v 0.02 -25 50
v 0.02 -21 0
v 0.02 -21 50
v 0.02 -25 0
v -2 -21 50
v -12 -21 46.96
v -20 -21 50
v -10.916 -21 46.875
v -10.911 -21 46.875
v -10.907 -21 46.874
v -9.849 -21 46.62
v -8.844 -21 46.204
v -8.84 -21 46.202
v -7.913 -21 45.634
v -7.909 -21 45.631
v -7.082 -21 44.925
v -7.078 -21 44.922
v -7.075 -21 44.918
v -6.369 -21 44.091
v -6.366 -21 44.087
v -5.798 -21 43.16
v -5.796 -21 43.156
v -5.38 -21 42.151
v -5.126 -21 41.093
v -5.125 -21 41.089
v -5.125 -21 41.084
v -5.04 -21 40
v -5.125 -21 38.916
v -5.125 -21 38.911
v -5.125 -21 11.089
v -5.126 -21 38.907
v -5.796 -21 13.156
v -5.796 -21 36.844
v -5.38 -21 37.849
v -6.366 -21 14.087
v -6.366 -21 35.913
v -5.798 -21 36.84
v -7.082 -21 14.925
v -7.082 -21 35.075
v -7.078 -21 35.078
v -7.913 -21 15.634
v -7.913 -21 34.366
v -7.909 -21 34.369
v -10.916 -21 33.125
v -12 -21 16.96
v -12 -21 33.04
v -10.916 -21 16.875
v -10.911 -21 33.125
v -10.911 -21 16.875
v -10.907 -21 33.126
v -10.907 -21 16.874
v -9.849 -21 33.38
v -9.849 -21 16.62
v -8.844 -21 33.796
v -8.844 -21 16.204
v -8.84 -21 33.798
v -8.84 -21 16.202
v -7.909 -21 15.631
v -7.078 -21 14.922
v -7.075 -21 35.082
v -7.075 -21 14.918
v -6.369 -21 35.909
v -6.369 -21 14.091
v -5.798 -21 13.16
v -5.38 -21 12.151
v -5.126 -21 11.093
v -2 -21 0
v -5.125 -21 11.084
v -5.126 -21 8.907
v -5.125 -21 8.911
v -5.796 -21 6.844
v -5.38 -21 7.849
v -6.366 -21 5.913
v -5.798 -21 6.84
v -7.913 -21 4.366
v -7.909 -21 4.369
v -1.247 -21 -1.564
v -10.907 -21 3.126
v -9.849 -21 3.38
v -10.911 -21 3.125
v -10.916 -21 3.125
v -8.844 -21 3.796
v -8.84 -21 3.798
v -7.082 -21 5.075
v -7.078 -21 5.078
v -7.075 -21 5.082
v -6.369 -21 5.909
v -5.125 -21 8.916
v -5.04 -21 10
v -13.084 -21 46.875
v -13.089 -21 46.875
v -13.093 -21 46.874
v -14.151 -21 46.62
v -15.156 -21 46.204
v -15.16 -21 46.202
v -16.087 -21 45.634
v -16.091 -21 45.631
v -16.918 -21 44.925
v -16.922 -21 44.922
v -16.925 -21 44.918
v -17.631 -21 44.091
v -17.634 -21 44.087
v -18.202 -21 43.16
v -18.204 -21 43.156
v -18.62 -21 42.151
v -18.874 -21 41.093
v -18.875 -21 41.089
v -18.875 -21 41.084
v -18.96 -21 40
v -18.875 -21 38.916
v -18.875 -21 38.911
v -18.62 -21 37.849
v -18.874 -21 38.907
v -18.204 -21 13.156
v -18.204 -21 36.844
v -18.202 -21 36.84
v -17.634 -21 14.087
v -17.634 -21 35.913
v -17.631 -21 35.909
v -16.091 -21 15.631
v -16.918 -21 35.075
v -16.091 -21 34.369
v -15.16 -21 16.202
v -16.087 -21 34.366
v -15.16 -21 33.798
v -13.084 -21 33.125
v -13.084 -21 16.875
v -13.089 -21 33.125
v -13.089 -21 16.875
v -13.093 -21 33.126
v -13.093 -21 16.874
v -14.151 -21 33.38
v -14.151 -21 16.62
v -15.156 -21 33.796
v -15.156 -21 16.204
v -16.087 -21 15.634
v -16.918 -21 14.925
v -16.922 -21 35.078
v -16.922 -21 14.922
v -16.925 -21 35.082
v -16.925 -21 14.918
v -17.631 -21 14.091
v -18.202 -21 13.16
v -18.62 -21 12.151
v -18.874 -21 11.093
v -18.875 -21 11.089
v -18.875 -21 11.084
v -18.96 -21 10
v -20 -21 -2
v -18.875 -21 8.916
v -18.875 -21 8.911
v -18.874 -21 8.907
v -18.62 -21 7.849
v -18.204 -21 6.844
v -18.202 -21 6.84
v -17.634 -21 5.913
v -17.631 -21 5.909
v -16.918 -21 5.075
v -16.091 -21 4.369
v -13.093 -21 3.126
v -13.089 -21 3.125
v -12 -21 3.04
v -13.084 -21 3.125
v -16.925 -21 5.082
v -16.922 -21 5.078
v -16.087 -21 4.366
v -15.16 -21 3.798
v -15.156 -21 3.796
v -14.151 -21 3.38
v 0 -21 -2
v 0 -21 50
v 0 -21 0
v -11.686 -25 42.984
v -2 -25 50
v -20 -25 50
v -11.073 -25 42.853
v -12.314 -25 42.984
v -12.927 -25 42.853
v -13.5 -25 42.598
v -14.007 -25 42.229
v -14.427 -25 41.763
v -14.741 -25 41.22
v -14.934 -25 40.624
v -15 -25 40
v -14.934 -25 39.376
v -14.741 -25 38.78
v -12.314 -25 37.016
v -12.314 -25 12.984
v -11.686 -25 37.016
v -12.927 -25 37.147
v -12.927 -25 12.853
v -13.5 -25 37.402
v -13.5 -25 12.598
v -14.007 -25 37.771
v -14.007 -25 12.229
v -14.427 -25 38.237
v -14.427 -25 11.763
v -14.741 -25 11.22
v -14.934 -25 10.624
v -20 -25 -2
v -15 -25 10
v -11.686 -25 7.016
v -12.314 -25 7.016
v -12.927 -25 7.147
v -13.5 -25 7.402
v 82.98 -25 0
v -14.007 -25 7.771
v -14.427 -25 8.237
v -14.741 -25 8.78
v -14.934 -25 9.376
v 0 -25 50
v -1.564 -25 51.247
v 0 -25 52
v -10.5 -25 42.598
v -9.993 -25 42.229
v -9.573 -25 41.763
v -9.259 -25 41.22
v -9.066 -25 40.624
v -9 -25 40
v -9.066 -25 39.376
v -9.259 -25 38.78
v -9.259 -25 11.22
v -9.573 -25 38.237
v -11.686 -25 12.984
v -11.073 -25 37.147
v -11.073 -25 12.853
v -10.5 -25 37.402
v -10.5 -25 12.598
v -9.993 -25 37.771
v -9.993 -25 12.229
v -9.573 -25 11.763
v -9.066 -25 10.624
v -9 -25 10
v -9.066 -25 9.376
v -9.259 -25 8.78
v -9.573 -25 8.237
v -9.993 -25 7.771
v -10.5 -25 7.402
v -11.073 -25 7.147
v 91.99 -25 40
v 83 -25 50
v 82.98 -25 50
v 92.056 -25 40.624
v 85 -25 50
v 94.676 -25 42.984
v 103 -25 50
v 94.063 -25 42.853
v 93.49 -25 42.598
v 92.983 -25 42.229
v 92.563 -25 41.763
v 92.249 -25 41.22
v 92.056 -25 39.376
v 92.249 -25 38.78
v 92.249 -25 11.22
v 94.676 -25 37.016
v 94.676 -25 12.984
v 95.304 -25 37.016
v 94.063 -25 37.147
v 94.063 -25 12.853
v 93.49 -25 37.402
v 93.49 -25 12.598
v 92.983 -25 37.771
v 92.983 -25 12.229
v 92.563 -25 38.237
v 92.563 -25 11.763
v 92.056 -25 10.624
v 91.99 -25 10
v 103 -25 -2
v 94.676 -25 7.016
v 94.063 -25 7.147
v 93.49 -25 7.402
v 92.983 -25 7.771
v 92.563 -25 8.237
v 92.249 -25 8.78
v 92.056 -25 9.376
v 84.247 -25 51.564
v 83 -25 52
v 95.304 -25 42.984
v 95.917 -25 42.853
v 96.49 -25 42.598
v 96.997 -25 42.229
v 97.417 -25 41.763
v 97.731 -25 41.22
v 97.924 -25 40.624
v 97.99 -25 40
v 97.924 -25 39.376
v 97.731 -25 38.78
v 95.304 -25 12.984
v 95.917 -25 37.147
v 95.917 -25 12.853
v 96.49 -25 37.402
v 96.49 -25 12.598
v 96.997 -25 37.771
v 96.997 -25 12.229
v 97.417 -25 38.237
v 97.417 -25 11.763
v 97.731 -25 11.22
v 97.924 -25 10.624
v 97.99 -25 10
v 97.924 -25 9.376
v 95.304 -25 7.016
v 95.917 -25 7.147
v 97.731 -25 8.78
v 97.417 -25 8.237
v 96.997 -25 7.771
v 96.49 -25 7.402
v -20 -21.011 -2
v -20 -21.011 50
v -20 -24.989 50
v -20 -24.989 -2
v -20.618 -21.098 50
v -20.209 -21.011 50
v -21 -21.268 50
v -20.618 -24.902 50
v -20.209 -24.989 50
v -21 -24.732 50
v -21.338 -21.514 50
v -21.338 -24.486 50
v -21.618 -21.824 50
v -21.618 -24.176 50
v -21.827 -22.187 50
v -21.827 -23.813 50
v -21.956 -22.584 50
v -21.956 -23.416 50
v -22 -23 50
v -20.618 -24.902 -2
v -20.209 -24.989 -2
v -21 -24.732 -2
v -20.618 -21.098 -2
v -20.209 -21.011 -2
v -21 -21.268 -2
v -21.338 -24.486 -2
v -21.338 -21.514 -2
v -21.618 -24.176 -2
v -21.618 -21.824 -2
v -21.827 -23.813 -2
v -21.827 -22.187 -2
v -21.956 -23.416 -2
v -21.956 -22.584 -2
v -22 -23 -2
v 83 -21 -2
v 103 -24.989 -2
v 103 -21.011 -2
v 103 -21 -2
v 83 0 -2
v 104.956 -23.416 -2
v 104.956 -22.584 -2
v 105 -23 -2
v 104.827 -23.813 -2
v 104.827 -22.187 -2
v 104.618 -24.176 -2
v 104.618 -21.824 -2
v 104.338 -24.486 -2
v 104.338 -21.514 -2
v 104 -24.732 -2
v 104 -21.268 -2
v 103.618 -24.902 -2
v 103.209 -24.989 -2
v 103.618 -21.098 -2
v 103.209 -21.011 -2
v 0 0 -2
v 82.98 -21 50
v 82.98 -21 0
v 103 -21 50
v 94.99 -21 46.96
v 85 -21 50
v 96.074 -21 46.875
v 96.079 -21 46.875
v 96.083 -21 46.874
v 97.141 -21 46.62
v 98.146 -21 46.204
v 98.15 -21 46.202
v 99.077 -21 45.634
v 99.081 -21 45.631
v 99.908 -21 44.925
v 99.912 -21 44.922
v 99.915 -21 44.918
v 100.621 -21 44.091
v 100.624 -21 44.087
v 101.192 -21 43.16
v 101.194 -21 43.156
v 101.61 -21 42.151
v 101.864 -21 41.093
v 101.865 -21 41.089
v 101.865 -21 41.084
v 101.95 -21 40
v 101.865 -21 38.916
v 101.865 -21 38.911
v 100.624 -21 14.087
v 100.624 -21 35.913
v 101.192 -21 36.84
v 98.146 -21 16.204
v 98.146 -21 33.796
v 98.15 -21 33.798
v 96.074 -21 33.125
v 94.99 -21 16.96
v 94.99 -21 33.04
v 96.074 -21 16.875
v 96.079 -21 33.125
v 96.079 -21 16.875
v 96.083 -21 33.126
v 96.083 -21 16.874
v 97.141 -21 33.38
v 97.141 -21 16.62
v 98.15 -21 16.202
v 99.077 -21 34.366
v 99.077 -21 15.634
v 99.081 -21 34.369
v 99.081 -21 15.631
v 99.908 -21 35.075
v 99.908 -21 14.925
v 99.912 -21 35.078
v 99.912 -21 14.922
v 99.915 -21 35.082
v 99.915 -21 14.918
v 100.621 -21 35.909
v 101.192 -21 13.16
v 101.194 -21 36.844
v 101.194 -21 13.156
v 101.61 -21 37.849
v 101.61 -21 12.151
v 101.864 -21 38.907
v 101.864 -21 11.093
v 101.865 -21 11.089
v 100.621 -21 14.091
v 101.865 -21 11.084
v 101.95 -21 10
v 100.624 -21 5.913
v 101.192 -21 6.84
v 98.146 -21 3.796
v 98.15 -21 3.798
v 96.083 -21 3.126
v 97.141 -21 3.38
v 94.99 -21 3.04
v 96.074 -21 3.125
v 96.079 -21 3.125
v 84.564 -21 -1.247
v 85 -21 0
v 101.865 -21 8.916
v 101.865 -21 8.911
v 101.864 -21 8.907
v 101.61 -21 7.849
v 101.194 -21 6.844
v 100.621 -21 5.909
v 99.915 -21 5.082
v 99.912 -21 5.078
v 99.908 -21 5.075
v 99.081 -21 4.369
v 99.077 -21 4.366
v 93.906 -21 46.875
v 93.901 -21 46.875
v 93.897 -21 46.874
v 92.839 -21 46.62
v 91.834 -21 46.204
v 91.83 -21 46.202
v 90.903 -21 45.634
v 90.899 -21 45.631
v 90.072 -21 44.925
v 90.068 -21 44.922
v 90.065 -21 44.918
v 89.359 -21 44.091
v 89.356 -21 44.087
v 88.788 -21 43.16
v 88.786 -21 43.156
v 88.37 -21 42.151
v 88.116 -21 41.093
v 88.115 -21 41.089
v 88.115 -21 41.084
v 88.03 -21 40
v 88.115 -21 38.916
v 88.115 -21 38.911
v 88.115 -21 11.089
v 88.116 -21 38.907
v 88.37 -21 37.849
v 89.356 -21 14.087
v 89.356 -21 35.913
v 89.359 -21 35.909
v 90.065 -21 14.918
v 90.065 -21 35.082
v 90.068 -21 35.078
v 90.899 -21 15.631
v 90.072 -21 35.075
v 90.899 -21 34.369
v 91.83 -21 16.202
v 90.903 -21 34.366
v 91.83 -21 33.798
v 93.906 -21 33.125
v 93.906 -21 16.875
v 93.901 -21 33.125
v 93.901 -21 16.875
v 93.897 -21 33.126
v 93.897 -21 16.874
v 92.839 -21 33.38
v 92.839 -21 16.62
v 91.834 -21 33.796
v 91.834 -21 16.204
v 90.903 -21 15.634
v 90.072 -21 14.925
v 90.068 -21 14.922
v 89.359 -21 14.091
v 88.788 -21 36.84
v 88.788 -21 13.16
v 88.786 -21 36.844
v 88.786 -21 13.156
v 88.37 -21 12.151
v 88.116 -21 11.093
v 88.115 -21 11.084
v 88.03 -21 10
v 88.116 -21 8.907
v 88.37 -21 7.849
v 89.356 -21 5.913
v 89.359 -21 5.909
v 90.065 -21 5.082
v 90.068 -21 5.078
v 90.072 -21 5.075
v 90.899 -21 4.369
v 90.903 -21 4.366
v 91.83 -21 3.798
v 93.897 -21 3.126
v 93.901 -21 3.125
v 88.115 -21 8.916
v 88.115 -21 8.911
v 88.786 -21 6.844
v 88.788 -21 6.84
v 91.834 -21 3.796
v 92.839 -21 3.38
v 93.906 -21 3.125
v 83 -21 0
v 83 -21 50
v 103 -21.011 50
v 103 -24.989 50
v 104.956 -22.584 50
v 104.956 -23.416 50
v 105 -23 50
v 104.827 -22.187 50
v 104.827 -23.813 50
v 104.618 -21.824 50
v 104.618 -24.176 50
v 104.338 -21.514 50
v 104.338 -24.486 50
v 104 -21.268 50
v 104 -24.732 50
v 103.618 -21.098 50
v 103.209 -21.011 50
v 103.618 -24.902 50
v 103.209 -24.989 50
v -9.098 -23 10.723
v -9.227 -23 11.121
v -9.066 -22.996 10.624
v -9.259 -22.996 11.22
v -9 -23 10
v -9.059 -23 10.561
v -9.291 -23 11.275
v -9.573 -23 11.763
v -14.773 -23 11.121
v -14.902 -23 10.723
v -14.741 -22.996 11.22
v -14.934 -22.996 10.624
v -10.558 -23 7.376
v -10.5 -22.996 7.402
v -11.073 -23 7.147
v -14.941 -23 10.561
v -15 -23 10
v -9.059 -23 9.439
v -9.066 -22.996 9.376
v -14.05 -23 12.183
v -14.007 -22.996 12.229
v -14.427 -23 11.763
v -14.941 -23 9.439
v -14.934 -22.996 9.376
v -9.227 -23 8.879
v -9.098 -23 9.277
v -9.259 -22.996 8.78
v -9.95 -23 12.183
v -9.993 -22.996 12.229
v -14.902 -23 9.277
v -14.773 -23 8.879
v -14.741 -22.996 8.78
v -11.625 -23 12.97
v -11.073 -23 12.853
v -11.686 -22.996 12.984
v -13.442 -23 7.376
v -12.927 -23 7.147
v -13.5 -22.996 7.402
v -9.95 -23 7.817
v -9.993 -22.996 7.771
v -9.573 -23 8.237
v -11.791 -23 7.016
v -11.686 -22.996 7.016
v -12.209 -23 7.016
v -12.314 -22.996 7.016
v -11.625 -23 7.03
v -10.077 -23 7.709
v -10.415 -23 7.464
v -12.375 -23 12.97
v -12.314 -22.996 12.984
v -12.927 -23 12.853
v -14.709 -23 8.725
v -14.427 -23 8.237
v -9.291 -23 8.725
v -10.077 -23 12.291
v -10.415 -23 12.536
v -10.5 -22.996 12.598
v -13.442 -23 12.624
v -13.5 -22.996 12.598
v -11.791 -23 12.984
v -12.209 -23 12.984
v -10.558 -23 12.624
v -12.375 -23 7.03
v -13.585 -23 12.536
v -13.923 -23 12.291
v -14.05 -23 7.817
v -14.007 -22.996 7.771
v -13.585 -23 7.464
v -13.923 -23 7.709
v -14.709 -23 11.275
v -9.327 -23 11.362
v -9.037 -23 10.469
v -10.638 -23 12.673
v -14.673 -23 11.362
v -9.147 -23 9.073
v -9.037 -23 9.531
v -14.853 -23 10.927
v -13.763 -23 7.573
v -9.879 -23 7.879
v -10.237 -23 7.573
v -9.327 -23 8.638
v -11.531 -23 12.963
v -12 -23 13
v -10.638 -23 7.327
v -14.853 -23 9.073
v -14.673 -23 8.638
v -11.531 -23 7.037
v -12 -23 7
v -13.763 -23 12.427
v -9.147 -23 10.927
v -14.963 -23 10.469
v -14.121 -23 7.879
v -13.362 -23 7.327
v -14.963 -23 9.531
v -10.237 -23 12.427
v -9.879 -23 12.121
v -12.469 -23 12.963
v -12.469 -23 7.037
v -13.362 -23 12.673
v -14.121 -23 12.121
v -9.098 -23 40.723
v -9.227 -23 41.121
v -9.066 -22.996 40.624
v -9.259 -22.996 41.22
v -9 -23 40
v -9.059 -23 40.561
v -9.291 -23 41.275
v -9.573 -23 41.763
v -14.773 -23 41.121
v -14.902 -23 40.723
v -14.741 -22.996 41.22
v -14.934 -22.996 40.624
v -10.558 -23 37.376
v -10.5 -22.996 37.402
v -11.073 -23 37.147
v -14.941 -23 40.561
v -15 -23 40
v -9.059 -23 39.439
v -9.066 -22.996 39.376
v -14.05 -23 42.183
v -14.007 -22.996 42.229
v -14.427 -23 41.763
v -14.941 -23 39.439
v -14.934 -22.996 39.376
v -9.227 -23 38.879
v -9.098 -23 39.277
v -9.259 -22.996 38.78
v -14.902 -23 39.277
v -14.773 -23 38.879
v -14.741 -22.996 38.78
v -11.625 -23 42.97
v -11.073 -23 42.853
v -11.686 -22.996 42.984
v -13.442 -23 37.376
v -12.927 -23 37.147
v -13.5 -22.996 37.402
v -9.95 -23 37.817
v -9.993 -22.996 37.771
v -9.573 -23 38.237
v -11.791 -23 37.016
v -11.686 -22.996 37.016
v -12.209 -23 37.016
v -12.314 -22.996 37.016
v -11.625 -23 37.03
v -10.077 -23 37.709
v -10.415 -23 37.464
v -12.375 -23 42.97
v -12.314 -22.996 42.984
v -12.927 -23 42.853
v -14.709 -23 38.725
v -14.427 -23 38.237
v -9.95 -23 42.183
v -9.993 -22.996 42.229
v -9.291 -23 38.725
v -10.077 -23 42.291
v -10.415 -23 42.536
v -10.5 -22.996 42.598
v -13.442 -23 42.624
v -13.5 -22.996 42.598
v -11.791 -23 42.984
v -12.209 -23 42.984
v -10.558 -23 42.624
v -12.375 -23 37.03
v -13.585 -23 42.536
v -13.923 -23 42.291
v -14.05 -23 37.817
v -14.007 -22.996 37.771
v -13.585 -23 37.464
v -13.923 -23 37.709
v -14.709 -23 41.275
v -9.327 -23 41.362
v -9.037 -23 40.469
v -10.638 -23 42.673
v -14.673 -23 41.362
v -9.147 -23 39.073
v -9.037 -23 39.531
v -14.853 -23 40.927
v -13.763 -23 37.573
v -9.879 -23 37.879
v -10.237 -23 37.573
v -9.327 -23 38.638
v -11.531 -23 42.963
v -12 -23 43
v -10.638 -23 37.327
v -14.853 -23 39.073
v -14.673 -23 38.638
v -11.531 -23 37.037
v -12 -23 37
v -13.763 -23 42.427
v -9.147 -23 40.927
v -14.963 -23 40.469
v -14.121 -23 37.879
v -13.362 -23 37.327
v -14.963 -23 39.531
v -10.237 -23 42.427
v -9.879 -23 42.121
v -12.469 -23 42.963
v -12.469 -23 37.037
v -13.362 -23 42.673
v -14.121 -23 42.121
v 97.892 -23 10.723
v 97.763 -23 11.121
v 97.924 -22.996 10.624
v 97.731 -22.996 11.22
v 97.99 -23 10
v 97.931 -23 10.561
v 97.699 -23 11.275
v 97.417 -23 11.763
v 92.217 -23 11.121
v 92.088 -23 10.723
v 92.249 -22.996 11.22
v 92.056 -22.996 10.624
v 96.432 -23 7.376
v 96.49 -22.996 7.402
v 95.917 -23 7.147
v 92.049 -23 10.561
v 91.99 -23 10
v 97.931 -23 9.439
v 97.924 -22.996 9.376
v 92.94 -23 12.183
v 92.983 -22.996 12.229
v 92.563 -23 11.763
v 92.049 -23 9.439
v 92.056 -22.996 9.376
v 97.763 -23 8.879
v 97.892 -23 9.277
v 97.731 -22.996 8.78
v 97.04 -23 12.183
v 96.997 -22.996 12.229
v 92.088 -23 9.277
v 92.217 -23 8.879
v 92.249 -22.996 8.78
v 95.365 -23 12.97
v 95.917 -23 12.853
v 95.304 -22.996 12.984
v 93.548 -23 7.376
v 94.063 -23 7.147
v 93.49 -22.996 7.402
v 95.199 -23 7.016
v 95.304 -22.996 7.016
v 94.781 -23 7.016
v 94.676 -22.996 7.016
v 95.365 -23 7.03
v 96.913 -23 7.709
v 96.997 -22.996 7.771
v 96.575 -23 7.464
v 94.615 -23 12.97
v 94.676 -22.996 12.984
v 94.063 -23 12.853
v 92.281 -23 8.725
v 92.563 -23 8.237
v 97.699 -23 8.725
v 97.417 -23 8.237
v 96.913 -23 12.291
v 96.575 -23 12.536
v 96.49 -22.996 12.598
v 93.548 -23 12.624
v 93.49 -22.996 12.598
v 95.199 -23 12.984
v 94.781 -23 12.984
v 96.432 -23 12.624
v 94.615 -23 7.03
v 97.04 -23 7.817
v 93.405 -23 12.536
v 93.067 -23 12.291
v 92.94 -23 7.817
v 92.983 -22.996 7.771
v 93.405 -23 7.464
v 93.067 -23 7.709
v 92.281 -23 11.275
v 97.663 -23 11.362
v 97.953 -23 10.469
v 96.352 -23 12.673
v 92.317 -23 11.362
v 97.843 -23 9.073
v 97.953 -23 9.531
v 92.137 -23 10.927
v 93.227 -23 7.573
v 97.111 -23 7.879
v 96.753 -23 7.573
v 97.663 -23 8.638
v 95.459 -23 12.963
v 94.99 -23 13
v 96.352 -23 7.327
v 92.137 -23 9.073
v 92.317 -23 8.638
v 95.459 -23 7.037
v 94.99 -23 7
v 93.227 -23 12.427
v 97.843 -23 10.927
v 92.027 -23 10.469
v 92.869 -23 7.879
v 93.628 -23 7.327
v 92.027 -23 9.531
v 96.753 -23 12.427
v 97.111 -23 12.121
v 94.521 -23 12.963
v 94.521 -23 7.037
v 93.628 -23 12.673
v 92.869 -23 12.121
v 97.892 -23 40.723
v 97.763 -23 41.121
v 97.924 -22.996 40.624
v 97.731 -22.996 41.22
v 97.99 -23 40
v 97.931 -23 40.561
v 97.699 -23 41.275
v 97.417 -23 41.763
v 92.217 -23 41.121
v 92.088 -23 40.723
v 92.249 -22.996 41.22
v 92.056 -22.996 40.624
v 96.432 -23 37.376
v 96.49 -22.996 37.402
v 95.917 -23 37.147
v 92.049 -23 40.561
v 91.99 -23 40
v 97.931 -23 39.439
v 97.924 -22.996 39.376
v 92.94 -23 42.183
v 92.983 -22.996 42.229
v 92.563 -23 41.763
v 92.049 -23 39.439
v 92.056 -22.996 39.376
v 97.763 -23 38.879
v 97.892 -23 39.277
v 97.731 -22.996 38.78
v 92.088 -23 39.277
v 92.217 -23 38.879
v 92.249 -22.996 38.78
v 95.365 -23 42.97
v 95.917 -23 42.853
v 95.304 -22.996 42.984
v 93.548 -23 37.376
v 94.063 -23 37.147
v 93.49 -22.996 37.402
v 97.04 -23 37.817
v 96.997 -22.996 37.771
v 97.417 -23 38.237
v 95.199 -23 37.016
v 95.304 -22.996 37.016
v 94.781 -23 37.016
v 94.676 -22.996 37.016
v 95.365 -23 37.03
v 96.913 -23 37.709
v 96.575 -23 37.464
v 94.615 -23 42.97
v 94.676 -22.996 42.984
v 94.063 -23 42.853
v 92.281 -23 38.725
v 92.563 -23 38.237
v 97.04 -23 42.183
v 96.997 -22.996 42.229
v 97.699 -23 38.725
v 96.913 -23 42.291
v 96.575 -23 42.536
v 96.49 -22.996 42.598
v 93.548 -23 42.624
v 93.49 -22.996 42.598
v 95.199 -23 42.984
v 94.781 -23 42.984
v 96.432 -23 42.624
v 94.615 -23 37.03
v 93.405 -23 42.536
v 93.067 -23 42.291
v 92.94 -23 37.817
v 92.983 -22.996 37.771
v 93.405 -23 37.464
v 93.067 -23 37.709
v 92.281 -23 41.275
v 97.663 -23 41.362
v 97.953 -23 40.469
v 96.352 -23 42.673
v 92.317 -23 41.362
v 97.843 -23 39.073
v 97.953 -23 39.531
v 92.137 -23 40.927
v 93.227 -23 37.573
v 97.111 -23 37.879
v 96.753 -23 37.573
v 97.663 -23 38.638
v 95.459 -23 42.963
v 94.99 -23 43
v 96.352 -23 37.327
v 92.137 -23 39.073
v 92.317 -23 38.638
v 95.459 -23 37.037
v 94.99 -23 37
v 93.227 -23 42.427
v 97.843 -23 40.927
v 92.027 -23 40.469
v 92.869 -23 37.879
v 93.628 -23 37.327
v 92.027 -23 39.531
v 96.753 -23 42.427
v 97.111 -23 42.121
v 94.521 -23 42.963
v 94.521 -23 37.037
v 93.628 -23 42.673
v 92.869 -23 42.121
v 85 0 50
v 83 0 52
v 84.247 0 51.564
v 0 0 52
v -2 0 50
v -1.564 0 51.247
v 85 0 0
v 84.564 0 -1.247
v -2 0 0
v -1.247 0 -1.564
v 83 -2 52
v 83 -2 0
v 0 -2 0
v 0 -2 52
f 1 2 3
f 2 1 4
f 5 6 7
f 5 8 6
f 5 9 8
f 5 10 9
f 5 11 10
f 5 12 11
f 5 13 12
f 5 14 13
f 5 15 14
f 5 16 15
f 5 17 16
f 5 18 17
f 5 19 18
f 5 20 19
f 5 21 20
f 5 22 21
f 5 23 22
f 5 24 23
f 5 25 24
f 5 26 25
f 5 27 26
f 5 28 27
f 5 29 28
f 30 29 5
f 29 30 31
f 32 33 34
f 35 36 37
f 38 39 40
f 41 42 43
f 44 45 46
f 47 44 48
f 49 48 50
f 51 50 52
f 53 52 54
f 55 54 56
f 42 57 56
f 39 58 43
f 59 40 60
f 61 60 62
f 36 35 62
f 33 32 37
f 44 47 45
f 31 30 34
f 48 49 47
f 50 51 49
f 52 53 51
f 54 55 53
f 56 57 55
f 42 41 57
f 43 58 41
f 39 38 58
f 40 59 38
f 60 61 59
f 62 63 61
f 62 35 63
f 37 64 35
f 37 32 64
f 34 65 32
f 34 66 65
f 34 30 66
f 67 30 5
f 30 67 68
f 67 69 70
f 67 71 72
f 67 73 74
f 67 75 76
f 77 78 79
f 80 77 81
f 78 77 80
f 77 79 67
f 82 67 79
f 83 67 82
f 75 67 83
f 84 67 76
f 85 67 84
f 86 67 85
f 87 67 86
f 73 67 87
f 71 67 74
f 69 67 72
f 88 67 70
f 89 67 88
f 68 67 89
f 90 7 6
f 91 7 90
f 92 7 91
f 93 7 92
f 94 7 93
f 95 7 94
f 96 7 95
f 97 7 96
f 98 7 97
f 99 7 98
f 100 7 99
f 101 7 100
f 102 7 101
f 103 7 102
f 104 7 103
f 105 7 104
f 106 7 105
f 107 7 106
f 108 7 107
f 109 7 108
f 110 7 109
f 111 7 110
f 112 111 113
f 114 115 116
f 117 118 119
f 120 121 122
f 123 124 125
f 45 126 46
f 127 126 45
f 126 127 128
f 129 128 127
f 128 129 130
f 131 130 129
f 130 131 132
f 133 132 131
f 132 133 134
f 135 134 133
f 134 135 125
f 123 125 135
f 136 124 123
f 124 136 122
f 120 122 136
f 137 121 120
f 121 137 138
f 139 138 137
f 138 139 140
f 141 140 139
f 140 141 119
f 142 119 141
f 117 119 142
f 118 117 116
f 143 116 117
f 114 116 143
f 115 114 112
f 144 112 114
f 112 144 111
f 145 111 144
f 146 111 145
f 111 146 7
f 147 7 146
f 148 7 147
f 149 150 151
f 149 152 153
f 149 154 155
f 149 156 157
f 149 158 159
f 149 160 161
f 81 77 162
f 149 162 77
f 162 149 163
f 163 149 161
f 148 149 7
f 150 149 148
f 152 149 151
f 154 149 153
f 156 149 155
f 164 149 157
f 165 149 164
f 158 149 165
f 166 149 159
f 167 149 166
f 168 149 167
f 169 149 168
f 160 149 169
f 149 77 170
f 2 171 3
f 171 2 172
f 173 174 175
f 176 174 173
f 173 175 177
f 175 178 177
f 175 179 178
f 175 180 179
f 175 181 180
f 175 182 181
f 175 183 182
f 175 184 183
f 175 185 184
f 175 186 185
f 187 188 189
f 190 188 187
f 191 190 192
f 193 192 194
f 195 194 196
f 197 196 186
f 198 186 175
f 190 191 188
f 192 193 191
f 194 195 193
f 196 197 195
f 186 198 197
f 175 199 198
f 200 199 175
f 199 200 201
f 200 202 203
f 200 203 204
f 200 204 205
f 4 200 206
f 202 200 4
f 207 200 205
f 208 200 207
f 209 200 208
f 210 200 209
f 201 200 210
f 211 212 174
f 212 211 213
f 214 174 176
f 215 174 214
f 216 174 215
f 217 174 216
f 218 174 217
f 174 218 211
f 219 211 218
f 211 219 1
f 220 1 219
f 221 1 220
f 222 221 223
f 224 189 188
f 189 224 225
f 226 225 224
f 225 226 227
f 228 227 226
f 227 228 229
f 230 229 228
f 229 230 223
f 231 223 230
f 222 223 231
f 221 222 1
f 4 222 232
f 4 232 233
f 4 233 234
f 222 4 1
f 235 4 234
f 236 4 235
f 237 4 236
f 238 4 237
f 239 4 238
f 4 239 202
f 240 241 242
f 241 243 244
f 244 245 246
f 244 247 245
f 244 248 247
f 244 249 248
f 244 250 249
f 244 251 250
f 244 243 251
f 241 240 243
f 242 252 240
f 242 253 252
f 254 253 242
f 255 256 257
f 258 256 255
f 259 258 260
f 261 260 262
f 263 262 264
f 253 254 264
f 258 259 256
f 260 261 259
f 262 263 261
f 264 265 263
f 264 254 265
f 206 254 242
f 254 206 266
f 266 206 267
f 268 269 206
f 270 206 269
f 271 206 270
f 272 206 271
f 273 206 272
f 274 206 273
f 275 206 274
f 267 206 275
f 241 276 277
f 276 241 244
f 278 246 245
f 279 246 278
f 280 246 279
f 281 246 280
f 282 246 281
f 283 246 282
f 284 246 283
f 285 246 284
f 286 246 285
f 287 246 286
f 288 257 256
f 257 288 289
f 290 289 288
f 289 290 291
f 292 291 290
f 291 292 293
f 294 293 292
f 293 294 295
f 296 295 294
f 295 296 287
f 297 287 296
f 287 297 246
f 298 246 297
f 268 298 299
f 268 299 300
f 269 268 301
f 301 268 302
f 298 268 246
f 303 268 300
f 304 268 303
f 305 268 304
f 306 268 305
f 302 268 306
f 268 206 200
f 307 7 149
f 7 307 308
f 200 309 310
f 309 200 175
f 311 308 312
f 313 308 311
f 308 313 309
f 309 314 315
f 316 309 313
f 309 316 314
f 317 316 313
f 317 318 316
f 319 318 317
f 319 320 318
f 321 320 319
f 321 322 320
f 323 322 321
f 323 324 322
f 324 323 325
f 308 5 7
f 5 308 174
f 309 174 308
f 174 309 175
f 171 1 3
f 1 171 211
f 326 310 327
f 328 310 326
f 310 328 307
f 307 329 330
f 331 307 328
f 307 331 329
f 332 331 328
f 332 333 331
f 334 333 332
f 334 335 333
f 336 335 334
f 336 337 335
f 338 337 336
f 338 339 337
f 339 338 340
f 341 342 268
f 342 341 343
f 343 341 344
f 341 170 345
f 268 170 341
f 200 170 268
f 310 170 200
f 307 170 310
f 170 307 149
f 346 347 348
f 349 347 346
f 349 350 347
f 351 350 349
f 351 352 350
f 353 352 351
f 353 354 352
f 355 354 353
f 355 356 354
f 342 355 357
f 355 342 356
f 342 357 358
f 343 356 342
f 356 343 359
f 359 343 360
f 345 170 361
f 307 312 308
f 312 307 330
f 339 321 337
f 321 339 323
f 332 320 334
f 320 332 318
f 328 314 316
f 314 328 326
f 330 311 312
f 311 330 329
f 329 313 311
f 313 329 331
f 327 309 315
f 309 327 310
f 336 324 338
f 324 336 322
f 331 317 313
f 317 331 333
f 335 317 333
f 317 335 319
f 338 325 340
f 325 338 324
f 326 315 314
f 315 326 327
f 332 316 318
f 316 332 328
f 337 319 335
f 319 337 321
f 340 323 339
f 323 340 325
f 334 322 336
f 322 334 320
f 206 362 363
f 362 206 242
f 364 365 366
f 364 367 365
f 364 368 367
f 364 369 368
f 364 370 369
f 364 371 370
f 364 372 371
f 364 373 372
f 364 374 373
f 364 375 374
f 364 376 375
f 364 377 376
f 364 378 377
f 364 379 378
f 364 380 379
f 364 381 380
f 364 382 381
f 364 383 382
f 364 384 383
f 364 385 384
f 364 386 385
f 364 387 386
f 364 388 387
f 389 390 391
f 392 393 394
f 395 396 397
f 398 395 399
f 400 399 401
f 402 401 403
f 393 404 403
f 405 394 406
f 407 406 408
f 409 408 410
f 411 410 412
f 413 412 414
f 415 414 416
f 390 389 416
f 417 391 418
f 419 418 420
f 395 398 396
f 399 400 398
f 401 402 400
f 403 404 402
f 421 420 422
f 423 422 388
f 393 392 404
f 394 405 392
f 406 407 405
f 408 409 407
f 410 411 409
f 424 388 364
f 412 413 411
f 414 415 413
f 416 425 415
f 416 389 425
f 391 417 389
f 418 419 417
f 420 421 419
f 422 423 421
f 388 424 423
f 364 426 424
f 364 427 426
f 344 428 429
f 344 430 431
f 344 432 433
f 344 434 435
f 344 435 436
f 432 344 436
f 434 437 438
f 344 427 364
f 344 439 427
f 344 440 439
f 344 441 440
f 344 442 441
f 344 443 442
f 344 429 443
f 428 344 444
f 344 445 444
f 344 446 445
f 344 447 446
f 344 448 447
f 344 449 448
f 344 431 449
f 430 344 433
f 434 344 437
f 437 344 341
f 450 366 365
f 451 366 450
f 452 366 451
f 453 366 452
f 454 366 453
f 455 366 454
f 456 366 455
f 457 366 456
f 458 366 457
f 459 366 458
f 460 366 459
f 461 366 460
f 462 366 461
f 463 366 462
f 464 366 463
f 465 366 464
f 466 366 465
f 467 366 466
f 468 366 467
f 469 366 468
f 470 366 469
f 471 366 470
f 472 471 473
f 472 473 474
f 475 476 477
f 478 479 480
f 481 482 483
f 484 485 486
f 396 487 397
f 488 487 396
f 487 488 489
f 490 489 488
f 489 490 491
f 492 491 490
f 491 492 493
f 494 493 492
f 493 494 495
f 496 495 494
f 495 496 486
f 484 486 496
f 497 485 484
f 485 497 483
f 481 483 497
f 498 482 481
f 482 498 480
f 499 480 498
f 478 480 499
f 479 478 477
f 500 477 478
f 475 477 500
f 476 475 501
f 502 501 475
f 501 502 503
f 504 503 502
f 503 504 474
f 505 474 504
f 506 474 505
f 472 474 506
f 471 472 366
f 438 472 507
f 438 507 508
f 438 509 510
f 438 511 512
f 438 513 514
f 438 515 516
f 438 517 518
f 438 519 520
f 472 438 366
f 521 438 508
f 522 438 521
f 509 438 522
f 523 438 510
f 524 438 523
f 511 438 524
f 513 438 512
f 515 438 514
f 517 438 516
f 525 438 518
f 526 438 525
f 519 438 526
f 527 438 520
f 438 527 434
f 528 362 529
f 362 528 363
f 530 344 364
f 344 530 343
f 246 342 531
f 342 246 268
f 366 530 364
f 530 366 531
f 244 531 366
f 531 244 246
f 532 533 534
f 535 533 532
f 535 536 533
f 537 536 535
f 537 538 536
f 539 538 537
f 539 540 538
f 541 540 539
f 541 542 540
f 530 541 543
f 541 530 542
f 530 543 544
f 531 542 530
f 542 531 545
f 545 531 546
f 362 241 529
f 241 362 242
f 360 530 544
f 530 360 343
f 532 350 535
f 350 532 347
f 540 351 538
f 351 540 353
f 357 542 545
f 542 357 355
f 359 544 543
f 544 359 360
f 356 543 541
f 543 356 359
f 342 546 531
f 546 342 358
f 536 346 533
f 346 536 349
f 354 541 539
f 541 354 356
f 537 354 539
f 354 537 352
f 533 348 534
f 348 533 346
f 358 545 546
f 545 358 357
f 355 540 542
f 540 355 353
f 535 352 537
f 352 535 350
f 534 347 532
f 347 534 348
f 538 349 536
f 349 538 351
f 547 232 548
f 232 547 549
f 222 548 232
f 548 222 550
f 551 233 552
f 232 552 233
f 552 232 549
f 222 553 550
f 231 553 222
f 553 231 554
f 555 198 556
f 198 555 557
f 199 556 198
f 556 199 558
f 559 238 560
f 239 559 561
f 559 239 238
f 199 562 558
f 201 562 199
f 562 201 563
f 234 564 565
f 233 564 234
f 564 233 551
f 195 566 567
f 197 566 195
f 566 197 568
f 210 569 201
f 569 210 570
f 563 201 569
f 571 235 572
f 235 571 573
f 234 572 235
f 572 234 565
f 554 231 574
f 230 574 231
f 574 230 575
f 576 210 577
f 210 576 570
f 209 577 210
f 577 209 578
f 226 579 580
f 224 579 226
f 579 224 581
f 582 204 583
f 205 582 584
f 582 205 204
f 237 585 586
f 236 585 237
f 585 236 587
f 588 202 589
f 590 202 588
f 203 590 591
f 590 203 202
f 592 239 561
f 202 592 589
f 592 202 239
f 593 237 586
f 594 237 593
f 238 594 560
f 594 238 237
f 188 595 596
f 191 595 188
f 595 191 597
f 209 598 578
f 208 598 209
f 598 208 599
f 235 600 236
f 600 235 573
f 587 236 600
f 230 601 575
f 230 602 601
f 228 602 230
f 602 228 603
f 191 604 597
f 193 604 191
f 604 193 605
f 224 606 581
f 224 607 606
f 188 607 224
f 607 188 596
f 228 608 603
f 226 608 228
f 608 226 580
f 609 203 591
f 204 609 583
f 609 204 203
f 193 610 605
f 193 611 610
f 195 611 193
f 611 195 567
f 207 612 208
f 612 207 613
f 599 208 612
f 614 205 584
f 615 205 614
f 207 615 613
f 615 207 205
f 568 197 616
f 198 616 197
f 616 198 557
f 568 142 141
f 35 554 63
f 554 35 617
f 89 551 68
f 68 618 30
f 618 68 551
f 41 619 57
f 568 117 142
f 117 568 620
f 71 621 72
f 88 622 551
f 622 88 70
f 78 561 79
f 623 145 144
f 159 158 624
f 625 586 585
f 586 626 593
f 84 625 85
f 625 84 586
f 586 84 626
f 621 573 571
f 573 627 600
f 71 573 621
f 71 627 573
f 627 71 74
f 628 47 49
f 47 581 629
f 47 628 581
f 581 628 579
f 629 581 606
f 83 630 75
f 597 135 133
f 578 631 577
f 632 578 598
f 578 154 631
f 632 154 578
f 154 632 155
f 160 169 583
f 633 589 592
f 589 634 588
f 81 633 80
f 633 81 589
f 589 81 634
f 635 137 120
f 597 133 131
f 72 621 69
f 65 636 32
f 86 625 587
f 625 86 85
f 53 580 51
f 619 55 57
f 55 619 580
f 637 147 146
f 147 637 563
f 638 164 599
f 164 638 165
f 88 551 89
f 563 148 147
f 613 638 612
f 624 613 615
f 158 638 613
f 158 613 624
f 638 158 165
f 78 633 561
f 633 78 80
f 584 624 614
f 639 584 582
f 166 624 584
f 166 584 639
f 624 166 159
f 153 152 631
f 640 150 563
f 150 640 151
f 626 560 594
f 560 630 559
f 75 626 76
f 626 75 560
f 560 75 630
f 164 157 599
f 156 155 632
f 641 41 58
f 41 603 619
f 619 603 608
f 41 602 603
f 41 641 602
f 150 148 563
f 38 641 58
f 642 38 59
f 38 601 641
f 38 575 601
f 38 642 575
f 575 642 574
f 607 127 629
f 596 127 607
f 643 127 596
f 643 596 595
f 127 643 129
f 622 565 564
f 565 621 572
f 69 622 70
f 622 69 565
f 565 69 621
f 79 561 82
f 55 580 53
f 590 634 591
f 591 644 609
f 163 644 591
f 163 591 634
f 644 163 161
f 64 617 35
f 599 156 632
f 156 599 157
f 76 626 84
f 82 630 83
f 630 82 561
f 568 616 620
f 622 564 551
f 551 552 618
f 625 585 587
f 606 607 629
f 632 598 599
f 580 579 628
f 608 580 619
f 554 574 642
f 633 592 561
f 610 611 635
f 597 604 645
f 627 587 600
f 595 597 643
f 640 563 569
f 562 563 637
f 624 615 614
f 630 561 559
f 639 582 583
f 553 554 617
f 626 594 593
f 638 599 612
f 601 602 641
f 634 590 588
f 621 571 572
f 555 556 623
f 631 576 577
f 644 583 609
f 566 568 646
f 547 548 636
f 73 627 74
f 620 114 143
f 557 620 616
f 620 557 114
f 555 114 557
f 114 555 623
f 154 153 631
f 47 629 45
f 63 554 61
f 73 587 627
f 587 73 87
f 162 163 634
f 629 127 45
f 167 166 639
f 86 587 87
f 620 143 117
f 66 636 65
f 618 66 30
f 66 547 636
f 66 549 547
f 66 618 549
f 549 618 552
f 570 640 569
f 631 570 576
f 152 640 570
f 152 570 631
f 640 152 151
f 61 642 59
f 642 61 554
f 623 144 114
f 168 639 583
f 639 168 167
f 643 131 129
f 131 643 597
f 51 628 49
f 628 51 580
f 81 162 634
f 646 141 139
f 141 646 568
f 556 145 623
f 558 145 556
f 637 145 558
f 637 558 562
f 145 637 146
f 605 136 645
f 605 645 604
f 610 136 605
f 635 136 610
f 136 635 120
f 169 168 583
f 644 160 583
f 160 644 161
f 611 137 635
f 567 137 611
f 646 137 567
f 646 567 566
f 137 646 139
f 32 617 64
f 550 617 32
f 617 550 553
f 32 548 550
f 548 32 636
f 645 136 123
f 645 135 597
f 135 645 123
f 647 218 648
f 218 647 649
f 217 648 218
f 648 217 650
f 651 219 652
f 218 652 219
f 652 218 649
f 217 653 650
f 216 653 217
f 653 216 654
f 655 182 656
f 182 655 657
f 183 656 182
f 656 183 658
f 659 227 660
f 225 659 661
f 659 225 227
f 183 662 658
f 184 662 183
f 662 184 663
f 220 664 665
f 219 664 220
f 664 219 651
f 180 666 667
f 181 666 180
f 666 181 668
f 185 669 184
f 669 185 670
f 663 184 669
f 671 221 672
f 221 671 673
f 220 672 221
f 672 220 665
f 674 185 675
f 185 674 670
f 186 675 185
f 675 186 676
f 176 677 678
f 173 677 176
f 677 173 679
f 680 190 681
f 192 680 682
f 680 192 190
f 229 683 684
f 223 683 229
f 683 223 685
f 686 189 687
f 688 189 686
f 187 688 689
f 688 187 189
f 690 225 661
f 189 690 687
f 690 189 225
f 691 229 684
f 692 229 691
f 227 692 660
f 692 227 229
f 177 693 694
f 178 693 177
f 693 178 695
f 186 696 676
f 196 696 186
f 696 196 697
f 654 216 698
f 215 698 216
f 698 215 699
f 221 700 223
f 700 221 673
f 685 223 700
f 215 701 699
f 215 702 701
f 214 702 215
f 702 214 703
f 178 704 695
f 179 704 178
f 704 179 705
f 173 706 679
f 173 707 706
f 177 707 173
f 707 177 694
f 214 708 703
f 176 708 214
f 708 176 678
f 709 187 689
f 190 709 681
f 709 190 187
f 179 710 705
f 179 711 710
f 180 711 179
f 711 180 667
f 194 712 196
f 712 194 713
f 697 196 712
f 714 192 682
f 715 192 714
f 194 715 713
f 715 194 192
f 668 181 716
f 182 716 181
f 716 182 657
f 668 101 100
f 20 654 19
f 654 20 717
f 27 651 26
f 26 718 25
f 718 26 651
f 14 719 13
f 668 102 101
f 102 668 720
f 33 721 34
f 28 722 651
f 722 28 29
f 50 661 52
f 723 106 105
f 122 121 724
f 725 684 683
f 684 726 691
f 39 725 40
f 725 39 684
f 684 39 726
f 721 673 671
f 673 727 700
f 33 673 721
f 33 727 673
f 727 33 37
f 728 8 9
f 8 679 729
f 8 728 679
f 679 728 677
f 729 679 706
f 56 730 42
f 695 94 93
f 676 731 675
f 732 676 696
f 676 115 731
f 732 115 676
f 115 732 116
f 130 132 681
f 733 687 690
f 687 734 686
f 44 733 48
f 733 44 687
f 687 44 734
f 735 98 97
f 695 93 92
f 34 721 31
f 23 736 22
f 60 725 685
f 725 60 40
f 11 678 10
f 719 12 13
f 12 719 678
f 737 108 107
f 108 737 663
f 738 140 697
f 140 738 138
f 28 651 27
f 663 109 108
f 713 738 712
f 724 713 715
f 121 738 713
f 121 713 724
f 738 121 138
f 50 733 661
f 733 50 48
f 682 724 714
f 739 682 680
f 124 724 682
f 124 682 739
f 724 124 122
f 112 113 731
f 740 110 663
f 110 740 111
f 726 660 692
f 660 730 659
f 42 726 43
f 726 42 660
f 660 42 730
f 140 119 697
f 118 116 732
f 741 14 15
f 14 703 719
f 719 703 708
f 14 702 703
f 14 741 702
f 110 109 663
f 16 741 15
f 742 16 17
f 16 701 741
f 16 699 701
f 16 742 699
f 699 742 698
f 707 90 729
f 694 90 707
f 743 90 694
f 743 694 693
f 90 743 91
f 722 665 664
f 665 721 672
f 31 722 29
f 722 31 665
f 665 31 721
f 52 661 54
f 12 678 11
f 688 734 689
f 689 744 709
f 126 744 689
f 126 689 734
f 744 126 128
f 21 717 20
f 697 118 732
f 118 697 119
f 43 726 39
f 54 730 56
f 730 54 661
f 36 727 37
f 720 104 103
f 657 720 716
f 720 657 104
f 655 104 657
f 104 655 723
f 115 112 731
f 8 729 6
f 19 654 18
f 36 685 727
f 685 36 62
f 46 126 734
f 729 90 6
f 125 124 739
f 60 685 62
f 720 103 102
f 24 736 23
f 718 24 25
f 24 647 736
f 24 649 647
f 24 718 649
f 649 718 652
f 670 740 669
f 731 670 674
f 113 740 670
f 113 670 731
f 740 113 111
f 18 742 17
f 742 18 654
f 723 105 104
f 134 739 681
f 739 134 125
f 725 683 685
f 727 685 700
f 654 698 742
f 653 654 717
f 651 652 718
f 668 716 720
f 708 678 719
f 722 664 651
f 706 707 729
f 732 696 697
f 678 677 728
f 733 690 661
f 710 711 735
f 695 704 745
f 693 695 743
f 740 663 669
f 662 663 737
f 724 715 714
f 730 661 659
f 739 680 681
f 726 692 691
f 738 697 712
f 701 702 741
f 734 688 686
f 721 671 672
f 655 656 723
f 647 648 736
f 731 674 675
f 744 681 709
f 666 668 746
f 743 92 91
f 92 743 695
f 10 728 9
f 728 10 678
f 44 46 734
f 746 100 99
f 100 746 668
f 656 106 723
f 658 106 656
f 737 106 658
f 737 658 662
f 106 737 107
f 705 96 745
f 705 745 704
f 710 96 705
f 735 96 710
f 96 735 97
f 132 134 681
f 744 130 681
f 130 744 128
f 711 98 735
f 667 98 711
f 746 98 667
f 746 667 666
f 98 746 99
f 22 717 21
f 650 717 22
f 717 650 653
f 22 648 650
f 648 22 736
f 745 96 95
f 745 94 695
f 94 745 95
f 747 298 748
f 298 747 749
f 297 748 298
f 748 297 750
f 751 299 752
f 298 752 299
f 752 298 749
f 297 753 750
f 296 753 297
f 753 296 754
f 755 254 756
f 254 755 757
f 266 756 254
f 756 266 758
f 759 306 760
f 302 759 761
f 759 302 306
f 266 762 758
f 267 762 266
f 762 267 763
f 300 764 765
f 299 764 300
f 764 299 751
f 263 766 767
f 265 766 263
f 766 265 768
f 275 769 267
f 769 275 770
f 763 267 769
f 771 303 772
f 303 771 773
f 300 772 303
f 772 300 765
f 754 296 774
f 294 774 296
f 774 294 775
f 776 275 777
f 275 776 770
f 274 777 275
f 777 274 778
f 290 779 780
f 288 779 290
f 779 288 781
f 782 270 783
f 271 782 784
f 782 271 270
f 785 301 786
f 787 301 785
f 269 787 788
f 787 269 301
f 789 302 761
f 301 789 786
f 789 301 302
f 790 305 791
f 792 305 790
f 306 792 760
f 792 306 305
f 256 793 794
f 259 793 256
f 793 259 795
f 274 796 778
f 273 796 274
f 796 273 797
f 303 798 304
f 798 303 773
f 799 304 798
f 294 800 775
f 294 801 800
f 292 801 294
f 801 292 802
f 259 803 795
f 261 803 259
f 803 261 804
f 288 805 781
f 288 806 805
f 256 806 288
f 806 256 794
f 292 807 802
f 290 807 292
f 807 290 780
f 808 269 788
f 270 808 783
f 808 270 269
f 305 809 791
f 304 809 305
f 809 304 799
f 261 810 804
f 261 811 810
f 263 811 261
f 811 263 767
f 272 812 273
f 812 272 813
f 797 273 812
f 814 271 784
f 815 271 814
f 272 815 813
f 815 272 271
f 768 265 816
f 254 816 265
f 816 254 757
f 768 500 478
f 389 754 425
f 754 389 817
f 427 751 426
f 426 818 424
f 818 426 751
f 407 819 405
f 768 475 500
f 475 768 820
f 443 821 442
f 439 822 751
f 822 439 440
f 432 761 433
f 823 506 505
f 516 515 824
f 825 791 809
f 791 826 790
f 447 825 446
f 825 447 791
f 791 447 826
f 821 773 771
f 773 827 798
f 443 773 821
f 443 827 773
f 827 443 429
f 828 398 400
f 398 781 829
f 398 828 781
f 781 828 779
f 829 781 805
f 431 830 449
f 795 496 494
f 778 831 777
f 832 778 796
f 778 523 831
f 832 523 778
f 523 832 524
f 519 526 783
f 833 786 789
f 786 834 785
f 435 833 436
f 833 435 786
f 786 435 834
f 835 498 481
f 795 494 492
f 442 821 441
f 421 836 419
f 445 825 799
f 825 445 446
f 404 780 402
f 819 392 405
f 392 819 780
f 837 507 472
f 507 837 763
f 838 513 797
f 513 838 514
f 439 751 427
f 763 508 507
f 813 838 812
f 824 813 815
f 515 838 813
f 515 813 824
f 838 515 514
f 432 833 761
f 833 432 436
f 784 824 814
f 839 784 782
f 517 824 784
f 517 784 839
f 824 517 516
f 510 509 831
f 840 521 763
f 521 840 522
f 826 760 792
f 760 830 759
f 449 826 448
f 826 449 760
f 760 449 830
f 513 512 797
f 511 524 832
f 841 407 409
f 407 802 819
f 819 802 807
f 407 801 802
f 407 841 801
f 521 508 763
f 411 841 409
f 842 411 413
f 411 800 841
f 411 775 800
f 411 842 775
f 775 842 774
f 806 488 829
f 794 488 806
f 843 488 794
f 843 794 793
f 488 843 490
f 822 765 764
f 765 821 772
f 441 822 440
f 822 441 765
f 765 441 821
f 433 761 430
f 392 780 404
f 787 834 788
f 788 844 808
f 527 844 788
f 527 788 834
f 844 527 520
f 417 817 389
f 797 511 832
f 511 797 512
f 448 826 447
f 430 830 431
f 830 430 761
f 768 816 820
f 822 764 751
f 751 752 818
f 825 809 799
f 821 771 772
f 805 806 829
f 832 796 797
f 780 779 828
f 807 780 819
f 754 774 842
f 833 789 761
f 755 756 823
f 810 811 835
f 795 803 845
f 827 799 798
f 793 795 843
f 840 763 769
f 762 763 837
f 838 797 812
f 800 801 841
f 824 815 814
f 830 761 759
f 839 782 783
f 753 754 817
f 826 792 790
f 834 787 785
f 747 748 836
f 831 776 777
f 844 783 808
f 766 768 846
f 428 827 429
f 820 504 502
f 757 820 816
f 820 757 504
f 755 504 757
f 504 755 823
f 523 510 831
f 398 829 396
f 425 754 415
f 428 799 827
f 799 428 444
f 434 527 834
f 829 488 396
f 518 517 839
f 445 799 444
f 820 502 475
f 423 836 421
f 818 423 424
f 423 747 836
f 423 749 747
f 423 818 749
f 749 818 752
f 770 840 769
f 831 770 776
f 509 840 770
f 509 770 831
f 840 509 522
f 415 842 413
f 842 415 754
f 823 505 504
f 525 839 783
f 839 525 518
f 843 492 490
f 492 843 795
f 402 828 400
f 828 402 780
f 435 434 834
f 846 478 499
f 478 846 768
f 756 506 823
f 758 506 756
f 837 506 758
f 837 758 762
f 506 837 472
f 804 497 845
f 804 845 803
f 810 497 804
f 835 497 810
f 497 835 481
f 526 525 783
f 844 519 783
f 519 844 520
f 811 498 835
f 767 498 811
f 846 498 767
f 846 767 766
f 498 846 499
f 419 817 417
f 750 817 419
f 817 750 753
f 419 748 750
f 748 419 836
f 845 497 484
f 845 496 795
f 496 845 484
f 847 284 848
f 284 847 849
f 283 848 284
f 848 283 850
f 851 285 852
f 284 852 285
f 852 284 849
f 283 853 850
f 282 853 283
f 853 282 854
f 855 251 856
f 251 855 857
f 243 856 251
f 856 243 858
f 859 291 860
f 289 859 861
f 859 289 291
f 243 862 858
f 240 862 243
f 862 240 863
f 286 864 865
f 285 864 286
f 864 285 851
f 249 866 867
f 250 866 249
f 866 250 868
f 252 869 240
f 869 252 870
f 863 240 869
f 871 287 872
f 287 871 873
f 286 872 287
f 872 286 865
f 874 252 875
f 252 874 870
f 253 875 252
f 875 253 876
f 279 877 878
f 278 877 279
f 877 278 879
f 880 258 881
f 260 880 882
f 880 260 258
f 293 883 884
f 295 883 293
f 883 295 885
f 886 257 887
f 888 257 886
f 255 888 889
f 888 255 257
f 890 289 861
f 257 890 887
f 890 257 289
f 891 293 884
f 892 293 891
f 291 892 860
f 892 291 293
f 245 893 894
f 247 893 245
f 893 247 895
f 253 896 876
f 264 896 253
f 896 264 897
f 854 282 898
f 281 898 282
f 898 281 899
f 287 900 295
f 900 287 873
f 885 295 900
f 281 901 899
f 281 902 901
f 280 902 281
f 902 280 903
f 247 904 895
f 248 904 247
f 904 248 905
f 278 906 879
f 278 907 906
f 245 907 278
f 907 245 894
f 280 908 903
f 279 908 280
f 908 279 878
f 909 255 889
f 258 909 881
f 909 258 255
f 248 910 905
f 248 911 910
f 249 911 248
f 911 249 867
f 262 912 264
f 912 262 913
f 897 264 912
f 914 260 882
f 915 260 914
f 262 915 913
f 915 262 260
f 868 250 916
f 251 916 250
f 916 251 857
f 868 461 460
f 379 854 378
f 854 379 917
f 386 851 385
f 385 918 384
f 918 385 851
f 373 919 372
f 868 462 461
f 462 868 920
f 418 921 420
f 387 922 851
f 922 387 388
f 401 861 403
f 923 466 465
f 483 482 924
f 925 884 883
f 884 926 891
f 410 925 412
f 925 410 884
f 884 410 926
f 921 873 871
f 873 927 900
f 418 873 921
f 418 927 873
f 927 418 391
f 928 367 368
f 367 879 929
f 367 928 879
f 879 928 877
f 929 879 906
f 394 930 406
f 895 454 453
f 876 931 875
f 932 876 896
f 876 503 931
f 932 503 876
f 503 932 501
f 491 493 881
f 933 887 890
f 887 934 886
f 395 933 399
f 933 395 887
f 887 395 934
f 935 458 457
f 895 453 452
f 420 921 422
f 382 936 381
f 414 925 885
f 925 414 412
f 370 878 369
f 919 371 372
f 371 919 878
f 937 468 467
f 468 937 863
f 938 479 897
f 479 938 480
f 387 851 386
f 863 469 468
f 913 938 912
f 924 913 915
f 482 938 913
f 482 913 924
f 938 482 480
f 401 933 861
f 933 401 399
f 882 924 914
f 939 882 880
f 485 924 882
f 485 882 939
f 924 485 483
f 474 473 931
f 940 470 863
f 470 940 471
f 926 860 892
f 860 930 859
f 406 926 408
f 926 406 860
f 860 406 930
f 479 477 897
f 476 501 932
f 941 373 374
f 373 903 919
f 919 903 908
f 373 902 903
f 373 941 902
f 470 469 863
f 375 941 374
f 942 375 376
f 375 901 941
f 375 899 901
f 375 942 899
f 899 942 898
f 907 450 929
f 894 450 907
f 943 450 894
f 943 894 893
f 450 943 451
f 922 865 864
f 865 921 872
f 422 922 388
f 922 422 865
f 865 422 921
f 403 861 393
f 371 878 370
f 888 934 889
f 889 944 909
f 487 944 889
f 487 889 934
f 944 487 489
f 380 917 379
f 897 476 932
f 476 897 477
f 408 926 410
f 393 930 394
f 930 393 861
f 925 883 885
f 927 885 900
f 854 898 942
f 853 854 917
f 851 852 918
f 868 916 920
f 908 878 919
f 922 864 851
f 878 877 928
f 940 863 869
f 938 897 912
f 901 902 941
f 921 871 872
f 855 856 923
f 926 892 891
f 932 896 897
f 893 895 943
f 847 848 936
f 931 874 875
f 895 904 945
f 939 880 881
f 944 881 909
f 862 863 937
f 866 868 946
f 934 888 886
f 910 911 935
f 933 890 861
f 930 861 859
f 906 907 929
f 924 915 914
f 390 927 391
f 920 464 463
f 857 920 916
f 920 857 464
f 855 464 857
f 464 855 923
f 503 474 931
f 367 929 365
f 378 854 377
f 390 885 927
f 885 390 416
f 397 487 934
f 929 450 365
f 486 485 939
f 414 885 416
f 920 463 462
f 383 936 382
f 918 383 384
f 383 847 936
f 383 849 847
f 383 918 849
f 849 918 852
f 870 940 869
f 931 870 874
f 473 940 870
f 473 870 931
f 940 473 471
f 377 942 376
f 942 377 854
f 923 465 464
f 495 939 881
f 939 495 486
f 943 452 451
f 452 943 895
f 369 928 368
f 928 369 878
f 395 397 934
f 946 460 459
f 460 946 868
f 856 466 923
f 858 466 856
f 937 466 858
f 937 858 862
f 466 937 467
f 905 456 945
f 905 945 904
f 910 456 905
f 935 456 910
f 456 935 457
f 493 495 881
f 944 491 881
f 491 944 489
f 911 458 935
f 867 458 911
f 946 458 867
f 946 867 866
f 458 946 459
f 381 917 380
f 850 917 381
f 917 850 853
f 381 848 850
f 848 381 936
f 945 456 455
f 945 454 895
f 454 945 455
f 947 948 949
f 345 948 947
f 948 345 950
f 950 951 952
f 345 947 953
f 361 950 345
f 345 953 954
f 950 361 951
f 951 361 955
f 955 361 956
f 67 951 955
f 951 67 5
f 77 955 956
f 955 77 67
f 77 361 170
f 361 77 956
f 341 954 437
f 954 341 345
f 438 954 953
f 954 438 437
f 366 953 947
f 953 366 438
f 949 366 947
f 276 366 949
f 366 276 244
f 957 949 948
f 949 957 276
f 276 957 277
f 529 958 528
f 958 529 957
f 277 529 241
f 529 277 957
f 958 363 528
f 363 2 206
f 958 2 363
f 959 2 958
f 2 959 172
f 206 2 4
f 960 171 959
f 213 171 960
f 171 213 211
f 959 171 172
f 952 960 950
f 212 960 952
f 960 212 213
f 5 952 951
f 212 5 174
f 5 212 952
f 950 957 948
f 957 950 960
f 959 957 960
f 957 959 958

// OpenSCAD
dims=[83,50,22];
//minkowski() {
rotate([90,0])
{
linear_extrude(dims[2]+3)
difference() {
  offset(2) square([dims[0],dims[1]]);
  square([dims[0],dims[1]+2]);
}
linear_extrude(2) offset(2) square([dims[0],dims[1]]);
translate([0,0,dims[2]+3]) mirror([0,0,1]) difference() {
  translate([dims[0]/2,0]) for(m=[0,1]) mirror([m,0]) translate([dims[0]/-2,0]) translate([-22,-2]) {
    translate([2,0]) cube([20.02,dims[1]+2,4]);
    translate([2,0,2]) rotate([-90,0]) cylinder(d=4,h=dims[1]+2,$fn=30);
  }
  for(x=[-22,dims[0]+1.99],y=[0,dims[1]-20])
    translate([x,y]) {
      translate([10,10,-.01]) cylinder(d=6,h=4.02,$fn=30);
      translate([10,10,2]) cylinder(d1=6,d2=14,h=2.02,$fn=40);
    }
  }
}
